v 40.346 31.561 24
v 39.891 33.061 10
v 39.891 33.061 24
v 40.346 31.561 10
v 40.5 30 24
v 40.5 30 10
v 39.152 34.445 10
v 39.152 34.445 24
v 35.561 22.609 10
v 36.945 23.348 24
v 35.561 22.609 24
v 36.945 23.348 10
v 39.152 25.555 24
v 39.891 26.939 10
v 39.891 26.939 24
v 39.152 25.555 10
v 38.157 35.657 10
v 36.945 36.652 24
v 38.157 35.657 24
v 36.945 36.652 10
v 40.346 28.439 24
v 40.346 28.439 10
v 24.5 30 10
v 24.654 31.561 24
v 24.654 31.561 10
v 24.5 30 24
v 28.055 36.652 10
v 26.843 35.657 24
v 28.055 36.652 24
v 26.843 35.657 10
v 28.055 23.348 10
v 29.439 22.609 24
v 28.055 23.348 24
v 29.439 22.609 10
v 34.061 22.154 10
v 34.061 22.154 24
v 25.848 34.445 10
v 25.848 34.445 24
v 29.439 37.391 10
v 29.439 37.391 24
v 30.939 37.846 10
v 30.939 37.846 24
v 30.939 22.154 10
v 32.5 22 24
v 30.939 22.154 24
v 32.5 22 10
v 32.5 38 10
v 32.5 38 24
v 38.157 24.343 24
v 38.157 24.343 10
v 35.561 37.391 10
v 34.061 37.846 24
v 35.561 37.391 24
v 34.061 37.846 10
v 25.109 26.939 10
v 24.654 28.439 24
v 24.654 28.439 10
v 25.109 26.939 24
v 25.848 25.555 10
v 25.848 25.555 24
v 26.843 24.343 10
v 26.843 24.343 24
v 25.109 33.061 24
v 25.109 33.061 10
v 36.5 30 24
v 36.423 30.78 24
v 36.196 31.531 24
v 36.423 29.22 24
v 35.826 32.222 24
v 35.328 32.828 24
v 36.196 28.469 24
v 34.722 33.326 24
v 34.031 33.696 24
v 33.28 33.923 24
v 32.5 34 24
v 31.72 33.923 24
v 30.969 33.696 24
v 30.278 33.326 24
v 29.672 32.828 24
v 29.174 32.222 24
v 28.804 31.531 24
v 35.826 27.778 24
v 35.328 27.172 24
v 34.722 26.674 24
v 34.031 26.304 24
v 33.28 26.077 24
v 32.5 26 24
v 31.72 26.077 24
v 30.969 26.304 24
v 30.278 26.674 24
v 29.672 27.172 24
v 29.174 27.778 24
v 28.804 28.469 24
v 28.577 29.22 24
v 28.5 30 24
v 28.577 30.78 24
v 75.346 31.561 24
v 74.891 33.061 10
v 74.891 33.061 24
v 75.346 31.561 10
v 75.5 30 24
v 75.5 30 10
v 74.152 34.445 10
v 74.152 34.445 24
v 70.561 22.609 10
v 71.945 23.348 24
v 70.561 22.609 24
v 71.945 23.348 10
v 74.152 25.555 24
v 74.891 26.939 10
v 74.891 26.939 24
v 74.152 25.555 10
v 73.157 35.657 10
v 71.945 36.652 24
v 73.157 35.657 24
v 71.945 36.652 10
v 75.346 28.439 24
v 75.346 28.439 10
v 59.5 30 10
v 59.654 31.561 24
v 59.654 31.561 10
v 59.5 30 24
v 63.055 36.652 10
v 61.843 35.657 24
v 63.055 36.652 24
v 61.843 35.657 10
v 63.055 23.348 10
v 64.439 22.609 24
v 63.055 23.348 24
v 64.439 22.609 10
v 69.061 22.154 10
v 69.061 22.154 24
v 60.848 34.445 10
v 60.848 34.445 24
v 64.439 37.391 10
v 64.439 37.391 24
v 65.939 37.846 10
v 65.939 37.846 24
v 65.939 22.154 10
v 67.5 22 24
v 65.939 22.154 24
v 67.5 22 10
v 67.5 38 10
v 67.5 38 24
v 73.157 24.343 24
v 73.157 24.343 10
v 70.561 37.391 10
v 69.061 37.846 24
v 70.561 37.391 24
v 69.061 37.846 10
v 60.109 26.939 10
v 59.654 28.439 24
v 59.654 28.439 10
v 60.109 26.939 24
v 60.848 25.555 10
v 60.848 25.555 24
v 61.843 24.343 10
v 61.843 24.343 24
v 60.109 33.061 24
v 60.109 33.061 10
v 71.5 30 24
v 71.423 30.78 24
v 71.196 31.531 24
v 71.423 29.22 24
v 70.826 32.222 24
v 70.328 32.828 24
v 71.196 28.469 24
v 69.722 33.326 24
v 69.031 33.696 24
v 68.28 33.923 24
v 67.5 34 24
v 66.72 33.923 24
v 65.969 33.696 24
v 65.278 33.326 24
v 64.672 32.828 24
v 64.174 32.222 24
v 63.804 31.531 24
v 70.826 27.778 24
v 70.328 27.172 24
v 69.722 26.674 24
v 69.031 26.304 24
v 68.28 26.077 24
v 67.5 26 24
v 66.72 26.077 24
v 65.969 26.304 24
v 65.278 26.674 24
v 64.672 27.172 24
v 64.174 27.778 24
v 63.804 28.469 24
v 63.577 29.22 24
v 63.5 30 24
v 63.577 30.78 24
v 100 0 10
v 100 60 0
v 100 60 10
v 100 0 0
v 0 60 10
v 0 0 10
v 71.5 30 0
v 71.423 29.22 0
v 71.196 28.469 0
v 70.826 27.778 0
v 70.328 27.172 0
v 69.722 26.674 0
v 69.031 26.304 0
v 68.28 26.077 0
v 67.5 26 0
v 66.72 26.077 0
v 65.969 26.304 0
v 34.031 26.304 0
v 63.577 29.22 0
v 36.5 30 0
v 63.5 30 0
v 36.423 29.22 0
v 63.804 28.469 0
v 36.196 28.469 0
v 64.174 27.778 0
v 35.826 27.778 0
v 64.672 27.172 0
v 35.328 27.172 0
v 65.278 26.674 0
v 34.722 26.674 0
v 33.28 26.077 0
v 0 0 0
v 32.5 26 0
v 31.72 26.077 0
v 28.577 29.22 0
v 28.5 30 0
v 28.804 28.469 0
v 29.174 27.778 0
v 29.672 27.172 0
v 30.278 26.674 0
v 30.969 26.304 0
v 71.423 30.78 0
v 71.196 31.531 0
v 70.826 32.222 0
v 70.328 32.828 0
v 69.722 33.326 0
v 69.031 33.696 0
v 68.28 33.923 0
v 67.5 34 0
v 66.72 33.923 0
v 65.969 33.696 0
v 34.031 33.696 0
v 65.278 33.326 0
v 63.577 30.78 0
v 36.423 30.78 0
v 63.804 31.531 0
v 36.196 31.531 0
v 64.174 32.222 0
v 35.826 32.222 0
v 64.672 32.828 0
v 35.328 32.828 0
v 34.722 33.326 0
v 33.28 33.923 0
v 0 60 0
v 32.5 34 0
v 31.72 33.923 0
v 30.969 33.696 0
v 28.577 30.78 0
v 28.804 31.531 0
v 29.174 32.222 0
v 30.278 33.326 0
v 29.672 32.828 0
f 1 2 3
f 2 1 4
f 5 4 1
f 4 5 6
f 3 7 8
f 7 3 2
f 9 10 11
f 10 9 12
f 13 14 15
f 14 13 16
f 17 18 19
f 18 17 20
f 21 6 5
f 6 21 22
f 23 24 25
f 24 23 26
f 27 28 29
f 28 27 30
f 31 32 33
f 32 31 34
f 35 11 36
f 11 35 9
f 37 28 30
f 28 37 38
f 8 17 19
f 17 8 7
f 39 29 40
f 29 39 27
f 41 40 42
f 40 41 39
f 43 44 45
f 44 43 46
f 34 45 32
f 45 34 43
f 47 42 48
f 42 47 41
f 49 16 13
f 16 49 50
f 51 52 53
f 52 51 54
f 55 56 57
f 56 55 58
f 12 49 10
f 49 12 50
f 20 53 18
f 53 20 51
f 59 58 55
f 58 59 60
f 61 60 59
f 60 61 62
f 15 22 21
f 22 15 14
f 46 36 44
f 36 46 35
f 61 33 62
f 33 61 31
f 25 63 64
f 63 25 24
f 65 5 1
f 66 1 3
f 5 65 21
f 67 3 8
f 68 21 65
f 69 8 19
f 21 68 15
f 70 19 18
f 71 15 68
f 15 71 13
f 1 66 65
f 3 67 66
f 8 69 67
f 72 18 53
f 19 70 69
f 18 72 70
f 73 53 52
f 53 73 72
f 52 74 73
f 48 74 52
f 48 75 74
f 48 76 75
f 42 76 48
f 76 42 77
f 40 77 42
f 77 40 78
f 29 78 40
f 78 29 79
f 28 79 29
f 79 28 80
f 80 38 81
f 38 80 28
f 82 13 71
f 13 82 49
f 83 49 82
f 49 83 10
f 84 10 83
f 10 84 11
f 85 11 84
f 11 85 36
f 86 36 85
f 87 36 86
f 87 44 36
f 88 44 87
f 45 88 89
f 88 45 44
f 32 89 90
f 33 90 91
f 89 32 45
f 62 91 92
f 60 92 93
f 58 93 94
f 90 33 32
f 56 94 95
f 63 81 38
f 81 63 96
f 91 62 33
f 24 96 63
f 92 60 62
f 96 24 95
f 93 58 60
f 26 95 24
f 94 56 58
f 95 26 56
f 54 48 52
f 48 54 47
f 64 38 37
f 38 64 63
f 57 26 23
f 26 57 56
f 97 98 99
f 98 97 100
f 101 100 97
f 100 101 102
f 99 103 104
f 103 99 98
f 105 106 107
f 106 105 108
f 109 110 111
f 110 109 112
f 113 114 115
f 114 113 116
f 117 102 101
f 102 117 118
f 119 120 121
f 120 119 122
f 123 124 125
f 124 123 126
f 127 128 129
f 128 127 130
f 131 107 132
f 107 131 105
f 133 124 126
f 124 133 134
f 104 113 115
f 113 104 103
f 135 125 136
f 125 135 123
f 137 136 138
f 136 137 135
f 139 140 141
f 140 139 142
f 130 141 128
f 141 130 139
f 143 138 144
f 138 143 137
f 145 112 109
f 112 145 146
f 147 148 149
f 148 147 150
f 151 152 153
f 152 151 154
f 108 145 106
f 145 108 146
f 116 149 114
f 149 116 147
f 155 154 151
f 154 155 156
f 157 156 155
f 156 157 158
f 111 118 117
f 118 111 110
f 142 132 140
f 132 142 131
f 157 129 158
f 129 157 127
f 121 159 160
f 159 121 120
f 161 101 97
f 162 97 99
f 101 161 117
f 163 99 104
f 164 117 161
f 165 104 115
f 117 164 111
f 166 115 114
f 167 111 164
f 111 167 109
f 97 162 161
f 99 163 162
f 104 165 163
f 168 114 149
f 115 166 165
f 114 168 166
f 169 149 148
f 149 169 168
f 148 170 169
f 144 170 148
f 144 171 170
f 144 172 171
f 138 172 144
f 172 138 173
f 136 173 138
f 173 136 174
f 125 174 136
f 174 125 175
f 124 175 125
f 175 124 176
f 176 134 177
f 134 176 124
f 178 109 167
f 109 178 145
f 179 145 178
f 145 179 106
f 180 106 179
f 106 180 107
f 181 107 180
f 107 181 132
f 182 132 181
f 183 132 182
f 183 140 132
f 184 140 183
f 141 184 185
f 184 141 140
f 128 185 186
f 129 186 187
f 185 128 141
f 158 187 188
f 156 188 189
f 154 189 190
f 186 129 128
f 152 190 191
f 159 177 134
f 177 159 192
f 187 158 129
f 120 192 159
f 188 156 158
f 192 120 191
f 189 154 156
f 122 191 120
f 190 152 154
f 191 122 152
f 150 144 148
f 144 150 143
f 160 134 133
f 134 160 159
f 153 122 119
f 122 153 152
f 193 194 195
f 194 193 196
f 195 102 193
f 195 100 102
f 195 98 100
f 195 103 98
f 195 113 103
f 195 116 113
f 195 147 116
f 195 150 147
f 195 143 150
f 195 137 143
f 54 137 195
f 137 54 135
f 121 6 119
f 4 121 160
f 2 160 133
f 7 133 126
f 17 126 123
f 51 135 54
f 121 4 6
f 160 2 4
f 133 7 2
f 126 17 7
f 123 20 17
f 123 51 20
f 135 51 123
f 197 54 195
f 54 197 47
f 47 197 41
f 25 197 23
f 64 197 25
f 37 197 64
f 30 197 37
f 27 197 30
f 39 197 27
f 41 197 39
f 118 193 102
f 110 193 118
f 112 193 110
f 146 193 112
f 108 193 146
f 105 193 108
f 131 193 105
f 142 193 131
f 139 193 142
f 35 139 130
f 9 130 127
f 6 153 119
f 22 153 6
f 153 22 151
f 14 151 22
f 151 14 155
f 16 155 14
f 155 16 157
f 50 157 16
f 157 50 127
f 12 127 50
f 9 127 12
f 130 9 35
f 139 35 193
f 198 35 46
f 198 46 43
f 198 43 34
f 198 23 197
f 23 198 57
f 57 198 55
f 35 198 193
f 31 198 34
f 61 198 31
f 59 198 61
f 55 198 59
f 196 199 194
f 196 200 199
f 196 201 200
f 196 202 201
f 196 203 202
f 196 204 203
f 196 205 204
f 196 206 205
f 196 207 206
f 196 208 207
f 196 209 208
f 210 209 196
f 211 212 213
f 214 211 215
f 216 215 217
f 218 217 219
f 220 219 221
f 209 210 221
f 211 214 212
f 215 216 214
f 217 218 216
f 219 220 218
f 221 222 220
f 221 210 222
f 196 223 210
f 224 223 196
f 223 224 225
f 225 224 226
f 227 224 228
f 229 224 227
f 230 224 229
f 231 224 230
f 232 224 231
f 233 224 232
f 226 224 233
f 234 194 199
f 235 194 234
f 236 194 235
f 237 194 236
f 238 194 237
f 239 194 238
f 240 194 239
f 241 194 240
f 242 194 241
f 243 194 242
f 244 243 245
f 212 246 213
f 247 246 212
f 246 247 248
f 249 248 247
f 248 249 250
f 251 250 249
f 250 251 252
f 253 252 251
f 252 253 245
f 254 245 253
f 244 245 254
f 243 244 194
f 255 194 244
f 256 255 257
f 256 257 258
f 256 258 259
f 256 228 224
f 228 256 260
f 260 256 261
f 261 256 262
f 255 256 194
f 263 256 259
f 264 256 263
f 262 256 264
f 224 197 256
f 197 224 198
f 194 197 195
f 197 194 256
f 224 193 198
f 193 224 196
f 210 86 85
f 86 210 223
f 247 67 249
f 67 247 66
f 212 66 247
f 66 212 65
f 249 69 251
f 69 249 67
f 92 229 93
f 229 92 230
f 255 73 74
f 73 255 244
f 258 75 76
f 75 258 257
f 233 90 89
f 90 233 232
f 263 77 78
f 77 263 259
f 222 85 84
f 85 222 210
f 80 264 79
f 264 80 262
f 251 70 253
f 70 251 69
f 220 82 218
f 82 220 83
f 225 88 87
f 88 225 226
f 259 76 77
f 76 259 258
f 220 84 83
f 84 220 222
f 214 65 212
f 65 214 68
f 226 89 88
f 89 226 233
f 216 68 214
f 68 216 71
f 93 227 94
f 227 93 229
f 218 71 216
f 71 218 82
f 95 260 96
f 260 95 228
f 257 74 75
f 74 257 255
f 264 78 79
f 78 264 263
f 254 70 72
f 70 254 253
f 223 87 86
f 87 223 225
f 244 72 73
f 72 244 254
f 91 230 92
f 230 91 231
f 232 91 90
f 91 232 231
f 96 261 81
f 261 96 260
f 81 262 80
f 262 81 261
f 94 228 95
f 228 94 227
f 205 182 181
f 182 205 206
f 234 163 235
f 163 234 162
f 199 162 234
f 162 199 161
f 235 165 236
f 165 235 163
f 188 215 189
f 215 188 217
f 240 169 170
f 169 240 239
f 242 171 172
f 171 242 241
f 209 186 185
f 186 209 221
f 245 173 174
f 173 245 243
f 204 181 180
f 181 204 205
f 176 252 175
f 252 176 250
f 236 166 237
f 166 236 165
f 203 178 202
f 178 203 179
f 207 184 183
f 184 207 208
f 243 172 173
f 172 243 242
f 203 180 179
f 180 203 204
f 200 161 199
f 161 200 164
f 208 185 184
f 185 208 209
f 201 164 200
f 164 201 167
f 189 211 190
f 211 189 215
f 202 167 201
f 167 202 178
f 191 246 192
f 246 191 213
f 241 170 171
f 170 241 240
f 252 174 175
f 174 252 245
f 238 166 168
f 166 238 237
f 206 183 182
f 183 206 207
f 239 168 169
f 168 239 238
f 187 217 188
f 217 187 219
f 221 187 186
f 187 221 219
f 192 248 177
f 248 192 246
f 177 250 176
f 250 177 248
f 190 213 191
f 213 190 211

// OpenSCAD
$fn = 32;

// ----------------------------------------------------------------------
// Drill jig: two_boss jig
// ----------------------------------------------------------------------

// --- parameters (mm) ---
plate_l = 100;            // plate length, X
plate_w = 60;             // plate width, Y
plate_t = 10;             // plate thickness
boss_d = 16;              // guide boss diameter
boss_h = 15;              // boss height above the plate
guide_d = 8;              // guide hole diameter
boss_pitch = 35;          // boss pitch

n_boss = 2;  // guide bosses
boss_x0 = (plate_l - (n_boss - 1) * boss_pitch) / 2;  // first boss X
boss_top = plate_t - 1 + boss_h;  // boss crown height
total_h = boss_top;  // overall height

difference() {
  union() {
  cube([plate_l, plate_w, plate_t]);
  for (i = [0 : n_boss - 1])
    translate([boss_x0 + i * boss_pitch, plate_w / 2, plate_t - 1])
      cylinder(h = boss_h, d = boss_d);
  }
  for (i = [0 : n_boss - 1])
    translate([boss_x0 + i * boss_pitch, plate_w / 2, -1])
      cylinder(h = plate_t + boss_h, d = guide_d);
}
